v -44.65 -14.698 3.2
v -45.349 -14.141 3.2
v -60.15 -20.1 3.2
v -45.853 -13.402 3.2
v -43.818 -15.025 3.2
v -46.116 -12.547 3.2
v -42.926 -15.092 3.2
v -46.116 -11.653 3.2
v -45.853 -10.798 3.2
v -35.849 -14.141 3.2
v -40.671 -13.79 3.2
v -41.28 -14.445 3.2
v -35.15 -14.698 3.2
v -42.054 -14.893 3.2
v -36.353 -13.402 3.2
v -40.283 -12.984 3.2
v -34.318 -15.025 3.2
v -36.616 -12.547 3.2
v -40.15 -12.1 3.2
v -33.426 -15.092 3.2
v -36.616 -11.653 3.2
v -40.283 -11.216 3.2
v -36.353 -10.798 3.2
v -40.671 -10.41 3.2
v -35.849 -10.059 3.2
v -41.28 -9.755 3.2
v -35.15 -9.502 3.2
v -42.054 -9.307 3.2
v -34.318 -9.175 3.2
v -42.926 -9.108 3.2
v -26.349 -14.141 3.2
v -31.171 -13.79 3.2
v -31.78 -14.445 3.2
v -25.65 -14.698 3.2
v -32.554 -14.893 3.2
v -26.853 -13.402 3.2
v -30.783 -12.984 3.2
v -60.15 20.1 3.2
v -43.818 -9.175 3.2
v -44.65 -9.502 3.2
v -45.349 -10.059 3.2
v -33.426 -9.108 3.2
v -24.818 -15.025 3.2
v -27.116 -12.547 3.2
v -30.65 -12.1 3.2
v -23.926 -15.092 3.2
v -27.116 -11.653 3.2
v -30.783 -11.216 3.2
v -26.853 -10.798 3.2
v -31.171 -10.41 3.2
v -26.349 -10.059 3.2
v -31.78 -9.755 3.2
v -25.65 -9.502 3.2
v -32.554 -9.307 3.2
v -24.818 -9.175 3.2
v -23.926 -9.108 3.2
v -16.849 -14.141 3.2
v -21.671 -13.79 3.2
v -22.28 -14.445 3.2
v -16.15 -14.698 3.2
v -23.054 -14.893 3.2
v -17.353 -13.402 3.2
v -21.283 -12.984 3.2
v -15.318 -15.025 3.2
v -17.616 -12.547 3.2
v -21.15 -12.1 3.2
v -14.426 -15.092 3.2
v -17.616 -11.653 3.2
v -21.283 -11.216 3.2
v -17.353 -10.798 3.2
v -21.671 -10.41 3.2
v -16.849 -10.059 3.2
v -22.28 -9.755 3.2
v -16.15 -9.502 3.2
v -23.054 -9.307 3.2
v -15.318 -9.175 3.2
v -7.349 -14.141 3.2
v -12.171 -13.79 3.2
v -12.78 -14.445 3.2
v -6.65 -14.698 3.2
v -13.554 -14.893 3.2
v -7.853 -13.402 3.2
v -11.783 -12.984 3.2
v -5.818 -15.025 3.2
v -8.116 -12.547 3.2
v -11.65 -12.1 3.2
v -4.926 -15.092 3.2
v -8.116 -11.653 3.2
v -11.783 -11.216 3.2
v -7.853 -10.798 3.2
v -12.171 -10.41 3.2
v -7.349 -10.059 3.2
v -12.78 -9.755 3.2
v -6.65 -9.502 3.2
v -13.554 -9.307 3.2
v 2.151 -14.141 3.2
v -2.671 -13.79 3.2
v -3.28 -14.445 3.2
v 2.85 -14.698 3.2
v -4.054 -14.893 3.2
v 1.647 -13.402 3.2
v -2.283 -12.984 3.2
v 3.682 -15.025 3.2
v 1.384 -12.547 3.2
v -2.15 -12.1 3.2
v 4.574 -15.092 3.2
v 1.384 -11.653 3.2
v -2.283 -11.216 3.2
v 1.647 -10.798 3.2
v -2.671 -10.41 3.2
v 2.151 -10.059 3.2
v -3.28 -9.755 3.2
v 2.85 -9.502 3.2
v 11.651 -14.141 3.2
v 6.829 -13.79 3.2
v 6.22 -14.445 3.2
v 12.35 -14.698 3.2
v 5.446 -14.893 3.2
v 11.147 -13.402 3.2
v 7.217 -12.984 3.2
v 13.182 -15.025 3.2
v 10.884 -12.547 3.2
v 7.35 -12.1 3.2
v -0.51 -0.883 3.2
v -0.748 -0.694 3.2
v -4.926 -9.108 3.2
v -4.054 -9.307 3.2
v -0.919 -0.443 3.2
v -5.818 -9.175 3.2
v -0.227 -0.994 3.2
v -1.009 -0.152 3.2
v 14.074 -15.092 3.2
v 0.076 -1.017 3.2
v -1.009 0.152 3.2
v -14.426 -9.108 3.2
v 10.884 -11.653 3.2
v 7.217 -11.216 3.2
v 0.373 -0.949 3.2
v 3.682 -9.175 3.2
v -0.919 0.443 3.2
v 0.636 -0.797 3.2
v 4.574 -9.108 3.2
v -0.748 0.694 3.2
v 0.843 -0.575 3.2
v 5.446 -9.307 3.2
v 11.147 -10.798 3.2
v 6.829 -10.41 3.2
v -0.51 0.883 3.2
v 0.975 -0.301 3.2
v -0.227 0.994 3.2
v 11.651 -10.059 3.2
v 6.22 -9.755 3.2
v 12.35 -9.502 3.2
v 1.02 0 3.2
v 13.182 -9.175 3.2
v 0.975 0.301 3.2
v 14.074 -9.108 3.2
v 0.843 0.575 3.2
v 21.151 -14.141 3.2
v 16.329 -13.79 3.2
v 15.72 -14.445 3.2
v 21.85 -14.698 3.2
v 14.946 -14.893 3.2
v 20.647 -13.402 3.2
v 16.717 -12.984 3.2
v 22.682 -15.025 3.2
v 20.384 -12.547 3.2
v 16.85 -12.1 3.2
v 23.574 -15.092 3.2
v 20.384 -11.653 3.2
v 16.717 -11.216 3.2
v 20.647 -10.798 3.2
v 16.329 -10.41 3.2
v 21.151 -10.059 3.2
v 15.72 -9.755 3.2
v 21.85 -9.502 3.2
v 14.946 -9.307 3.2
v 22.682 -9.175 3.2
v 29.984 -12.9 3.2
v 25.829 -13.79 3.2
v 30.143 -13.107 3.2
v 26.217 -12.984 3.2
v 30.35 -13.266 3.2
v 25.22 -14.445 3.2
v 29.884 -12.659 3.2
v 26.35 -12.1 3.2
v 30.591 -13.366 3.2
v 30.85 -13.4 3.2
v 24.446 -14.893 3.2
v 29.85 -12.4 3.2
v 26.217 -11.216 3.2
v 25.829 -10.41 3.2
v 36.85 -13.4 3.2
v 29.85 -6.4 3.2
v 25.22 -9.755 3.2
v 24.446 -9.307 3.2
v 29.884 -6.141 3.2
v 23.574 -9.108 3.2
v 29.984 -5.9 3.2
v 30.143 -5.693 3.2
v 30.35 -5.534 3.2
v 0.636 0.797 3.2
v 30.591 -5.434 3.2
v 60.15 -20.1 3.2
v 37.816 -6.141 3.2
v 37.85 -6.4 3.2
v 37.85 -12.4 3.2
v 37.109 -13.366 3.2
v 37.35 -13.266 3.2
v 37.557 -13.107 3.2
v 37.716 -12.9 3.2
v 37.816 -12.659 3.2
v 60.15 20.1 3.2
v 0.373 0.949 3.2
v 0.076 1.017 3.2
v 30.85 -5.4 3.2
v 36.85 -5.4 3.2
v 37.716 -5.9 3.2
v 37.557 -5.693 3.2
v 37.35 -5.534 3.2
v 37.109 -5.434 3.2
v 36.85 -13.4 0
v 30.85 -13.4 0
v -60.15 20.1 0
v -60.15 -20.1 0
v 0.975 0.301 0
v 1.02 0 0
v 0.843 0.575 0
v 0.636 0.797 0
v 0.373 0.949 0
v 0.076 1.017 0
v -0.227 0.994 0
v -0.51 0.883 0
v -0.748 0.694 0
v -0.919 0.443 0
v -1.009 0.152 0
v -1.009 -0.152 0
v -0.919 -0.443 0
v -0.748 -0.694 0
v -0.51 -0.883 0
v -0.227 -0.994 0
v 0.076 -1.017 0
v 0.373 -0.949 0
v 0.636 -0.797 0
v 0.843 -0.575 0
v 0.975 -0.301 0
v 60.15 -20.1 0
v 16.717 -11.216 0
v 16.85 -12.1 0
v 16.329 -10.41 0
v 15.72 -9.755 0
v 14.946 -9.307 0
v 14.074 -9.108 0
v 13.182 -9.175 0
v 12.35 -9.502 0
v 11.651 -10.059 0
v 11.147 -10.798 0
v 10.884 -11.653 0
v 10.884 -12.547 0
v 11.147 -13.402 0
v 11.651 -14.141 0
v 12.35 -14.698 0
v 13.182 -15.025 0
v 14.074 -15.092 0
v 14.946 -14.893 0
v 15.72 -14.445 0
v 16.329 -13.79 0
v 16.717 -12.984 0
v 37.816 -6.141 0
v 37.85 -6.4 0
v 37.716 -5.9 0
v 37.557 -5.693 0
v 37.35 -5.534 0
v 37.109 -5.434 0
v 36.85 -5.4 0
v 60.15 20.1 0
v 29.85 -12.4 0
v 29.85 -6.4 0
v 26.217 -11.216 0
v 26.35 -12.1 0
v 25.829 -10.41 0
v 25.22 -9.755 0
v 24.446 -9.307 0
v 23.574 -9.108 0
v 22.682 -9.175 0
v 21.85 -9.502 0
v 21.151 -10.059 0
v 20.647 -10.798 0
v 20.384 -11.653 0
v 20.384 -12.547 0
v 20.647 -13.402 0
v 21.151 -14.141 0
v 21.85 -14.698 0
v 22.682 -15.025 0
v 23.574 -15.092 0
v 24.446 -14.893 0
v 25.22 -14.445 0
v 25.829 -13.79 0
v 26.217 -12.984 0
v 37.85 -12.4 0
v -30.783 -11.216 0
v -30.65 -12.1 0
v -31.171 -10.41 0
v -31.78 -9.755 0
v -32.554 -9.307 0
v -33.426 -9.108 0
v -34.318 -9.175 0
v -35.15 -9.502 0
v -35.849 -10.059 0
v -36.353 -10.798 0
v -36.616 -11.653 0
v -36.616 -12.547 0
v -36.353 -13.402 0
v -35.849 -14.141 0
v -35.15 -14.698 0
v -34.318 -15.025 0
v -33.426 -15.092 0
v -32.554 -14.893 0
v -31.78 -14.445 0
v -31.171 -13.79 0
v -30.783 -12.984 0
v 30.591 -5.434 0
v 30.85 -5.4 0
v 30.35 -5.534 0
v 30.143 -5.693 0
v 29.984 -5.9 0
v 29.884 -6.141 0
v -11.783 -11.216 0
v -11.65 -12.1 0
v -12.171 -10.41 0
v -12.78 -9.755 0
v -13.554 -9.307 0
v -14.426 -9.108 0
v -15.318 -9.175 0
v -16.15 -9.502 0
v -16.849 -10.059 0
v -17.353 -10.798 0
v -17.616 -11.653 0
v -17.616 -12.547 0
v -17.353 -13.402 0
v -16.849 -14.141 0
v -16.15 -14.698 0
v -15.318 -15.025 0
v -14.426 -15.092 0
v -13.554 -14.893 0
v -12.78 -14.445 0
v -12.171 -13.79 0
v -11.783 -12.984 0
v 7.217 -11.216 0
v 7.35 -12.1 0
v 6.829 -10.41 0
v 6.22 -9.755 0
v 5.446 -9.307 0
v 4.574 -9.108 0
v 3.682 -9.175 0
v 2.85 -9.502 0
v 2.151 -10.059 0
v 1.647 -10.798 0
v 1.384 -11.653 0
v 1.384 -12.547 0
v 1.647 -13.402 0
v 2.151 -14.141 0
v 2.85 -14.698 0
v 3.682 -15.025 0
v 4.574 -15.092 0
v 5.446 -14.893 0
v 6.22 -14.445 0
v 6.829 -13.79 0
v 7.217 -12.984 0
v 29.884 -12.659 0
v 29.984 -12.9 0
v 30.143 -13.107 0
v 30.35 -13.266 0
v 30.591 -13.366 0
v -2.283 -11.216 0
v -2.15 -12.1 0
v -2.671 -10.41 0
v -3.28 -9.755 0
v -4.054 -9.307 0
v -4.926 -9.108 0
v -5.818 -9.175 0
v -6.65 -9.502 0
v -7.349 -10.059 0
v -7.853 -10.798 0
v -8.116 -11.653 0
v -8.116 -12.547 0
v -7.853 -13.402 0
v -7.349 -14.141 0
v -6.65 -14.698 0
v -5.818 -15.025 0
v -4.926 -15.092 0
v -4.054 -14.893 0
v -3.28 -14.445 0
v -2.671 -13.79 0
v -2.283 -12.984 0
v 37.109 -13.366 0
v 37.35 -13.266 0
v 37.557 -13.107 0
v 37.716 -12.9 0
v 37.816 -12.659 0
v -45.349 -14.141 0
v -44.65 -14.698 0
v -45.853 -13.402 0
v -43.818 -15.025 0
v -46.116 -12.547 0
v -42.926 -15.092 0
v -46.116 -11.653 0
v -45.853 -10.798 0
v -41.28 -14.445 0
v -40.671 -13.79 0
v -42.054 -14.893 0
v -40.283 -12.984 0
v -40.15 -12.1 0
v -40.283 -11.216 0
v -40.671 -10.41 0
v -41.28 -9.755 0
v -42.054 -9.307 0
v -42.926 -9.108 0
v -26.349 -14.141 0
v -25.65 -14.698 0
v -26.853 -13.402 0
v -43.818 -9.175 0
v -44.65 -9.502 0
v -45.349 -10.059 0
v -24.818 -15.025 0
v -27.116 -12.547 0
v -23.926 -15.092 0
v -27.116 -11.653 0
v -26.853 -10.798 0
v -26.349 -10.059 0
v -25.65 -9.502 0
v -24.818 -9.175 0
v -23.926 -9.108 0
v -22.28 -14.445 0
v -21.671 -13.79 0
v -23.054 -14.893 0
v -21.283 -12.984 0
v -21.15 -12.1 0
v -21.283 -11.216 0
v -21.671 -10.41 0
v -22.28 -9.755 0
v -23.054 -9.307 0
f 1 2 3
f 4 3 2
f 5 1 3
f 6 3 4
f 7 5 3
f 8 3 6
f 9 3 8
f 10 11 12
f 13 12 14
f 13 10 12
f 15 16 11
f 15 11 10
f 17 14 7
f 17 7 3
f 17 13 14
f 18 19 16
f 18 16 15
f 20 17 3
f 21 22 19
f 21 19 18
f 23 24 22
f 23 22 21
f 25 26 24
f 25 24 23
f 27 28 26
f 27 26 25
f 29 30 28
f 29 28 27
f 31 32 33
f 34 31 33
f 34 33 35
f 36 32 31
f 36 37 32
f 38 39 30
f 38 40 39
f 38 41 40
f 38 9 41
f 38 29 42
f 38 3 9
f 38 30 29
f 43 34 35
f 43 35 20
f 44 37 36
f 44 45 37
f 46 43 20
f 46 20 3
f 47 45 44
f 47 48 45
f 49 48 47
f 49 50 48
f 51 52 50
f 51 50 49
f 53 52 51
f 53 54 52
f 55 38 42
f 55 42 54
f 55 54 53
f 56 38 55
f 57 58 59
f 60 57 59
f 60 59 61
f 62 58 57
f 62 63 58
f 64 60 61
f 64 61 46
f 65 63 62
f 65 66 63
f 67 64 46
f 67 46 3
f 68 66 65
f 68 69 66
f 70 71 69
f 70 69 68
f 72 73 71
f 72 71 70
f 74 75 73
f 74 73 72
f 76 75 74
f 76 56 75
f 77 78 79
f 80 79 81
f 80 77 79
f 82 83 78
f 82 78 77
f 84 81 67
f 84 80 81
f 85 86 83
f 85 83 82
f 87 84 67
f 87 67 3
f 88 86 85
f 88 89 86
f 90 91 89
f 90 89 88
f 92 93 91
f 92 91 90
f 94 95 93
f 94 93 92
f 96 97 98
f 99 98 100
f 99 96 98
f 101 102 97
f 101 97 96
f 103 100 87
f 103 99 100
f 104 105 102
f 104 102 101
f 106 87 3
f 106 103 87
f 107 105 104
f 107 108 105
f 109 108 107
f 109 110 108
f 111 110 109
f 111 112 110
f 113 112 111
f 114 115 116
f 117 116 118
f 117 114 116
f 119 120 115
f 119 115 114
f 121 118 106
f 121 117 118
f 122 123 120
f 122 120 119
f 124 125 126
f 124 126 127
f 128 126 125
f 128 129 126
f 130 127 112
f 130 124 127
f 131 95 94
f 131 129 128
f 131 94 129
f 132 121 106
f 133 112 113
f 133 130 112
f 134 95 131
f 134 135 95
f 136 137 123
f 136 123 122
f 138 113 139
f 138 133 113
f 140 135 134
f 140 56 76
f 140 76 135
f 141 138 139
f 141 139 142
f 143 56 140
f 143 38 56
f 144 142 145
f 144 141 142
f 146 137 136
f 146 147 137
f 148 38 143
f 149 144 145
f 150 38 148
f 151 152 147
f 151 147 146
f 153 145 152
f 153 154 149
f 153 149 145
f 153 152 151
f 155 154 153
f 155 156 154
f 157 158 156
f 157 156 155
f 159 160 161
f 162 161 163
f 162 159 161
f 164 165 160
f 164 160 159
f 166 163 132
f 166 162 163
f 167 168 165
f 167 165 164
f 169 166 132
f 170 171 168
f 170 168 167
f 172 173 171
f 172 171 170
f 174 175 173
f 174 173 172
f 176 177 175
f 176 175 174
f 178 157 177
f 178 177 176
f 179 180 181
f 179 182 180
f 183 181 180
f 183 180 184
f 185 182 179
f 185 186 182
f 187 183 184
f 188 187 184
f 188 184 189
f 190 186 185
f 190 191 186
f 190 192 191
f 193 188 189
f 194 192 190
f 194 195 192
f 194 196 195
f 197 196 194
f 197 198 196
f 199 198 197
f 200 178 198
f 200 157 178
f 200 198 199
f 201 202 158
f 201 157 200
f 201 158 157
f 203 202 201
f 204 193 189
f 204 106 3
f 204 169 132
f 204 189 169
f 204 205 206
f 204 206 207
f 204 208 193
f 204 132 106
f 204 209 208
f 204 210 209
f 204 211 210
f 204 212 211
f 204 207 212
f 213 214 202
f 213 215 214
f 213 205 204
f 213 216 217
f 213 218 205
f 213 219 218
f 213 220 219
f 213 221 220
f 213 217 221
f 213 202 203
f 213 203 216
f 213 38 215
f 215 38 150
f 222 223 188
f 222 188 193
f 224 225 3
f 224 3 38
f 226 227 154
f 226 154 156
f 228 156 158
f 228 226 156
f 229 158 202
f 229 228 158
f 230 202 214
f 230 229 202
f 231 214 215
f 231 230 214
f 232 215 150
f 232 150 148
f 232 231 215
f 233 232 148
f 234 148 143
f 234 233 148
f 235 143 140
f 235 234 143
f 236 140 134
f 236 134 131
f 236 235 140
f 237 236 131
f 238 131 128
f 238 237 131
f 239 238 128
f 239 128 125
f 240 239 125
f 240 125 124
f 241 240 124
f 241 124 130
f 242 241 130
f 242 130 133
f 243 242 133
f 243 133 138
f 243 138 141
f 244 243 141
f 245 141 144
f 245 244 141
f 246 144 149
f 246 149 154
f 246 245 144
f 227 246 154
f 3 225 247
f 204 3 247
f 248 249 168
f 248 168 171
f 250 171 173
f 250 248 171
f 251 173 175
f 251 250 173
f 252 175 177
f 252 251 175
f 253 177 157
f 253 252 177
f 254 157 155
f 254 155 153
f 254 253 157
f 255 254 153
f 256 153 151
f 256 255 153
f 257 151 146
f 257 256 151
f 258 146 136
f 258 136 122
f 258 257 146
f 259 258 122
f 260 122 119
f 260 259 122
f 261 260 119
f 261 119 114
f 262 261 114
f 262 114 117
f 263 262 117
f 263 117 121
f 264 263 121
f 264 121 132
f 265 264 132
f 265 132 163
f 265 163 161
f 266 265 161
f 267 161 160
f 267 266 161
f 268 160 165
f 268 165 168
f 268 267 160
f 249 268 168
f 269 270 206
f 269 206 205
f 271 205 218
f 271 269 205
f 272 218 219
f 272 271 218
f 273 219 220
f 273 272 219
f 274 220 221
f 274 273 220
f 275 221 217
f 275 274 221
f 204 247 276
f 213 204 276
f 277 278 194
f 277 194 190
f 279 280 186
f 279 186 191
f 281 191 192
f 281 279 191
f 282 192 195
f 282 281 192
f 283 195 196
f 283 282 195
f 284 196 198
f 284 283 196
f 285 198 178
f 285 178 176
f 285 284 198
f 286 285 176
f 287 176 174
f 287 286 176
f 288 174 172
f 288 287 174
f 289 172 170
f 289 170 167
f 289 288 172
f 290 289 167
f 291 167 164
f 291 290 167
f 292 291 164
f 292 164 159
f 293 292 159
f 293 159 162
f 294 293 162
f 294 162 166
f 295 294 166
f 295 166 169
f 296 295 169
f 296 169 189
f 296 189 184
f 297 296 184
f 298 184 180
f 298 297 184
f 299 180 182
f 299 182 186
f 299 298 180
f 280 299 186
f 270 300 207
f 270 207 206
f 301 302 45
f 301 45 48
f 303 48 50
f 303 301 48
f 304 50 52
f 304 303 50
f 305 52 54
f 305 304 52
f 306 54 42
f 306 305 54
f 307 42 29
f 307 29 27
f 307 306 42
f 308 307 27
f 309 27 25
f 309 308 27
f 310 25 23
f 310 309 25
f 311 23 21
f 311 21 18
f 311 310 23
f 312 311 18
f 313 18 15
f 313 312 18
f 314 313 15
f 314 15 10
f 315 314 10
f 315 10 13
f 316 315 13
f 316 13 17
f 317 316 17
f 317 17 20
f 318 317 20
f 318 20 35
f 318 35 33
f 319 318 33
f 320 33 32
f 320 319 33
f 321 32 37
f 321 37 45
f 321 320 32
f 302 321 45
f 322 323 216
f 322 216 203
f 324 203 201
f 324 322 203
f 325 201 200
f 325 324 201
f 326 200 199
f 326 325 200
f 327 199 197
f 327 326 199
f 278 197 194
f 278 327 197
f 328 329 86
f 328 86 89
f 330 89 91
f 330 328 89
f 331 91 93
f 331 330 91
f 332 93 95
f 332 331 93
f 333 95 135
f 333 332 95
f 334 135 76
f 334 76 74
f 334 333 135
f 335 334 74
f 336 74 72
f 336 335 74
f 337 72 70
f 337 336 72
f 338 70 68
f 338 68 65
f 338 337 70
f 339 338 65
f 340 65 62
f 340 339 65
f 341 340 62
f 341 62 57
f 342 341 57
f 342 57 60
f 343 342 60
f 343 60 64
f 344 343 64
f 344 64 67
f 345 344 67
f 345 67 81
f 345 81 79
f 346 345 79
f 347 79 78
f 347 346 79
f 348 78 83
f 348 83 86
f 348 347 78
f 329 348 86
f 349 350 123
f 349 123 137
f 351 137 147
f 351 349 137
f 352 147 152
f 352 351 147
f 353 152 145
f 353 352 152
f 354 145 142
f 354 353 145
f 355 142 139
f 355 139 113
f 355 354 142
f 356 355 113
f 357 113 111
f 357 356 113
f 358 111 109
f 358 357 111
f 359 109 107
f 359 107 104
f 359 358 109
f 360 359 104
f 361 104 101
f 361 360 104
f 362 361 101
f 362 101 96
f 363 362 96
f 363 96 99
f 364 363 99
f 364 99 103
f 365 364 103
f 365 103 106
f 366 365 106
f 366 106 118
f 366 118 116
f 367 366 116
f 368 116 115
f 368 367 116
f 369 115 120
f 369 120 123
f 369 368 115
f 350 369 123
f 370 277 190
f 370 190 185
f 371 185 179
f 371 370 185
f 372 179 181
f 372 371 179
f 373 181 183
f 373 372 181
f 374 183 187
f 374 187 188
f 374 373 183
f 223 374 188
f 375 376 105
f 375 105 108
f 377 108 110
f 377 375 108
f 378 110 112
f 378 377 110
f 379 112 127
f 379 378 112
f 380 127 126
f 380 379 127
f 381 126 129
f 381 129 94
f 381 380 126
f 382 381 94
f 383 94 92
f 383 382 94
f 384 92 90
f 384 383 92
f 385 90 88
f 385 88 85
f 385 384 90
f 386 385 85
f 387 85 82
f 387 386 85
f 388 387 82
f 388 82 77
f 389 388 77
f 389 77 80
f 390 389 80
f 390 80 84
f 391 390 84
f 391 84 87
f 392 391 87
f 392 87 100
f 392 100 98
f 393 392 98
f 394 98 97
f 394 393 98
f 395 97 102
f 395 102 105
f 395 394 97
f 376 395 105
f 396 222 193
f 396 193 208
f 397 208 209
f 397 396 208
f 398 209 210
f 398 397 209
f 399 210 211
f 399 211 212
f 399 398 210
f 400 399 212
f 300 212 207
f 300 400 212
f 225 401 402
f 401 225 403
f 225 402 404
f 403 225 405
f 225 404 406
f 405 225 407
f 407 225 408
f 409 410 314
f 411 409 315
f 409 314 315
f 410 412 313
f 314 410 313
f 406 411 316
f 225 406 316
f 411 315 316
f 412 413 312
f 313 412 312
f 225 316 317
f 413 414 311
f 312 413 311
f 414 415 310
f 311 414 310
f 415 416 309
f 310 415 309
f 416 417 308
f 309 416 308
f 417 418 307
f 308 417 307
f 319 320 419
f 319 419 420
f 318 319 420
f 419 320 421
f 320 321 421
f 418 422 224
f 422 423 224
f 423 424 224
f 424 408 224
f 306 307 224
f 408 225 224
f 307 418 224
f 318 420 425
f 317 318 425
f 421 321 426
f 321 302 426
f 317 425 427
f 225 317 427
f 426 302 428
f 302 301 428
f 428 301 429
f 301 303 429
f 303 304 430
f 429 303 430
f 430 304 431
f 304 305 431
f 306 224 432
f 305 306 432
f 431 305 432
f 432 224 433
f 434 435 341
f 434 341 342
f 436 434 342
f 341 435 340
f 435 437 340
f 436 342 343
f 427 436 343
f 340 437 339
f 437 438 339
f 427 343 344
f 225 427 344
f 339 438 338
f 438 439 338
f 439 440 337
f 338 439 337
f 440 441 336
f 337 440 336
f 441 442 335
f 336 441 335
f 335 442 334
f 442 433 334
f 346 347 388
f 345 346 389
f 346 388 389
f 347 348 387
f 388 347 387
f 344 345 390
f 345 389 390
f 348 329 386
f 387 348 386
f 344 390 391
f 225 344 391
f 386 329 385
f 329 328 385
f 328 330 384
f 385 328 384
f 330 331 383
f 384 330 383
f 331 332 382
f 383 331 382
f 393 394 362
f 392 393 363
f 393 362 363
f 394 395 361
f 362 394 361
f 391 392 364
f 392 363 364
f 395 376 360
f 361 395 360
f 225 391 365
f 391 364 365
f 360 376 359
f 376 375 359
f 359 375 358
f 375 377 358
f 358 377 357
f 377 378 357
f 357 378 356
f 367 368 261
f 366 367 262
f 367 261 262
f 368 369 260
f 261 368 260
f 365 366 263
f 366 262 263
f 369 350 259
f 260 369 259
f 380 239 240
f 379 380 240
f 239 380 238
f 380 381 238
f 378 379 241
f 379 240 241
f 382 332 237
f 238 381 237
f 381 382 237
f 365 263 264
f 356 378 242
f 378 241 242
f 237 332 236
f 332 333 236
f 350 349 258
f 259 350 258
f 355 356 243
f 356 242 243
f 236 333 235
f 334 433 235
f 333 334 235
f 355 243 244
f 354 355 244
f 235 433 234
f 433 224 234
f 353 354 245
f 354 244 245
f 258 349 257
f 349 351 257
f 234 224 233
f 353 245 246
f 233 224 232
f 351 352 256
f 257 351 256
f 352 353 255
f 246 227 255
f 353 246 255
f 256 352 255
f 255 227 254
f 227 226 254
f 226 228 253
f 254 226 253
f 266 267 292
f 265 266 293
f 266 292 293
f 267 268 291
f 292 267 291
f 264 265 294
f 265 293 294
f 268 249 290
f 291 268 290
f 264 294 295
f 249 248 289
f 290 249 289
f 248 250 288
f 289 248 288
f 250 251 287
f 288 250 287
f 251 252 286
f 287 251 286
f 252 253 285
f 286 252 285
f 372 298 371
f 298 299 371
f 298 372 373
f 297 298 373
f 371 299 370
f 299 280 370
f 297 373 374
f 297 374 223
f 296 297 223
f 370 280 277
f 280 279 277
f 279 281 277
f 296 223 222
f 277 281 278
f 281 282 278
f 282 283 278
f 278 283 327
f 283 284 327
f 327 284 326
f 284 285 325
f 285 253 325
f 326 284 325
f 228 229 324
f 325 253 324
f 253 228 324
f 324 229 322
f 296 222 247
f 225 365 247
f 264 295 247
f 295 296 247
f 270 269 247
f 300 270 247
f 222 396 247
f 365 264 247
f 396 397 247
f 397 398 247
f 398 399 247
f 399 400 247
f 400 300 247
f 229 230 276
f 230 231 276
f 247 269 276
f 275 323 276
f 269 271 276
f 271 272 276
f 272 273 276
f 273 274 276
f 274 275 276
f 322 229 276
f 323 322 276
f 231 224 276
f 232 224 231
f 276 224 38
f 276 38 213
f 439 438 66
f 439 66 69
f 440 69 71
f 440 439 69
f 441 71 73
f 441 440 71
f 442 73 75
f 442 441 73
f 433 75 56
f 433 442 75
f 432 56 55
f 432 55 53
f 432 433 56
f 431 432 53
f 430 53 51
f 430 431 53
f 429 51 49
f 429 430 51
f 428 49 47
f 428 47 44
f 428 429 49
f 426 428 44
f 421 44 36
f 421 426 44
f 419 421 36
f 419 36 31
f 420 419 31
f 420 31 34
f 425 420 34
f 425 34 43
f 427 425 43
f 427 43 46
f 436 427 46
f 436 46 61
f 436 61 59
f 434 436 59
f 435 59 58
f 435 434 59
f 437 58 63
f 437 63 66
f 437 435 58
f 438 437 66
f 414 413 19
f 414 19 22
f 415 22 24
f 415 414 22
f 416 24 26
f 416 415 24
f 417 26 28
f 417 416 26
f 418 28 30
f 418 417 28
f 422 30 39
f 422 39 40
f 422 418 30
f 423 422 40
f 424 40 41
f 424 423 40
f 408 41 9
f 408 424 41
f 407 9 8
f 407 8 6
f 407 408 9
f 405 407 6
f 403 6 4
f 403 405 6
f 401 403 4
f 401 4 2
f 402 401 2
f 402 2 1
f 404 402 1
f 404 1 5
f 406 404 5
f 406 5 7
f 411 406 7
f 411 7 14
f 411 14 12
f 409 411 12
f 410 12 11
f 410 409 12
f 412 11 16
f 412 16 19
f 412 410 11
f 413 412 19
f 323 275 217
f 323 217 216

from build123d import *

# Parameters (mm, degrees)
SKETCH_W   = 120.3
SKETCH_H   = 40.2
SKETCH_R   = 3
SKETCH_R_2 = 1.02
PAD_DEPTH  = 3.2


with BuildPart() as part:
    # Sketch → Pad (new body)
    with BuildSketch(Plane.XY):
        Rectangle(SKETCH_W, SKETCH_H)
        with Locations((-43.15, -12.1)):
            Circle(SKETCH_R, mode=Mode.SUBTRACT)
        with Locations((-33.65, -12.1)):
            Circle(SKETCH_R, mode=Mode.SUBTRACT)
        with Locations((-24.15, -12.1)):
            Circle(SKETCH_R, mode=Mode.SUBTRACT)
        with Locations((-14.65, -12.1)):
            Circle(SKETCH_R, mode=Mode.SUBTRACT)
        with Locations((13.85, -12.1)):
            Circle(SKETCH_R, mode=Mode.SUBTRACT)
        with Locations((-5.15, -12.1)):
            Circle(SKETCH_R, mode=Mode.SUBTRACT)
        with Locations((4.35, -12.1)):
            Circle(SKETCH_R, mode=Mode.SUBTRACT)
        with Locations((23.35, -12.1)):
            Circle(SKETCH_R, mode=Mode.SUBTRACT)
        Circle(SKETCH_R_2, mode=Mode.SUBTRACT)
        with BuildLine():
            Line((36.85, -5.4), (30.85, -5.4))
            ThreePointArc((30.85, -5.4), (30.142893, -5.692893), (29.85, -6.4))
            Line((29.85, -6.4), (29.85, -12.4))
            ThreePointArc((29.85, -12.4), (30.142893, -13.107107), (30.85, -13.4))
            Line((30.85, -13.4), (36.85, -13.4))
            ThreePointArc((36.85, -13.4), (37.557107, -13.107107), (37.85, -12.4))
            Line((37.85, -12.4), (37.85, -6.4))
            ThreePointArc((37.85, -6.4), (37.557107, -5.692893), (36.85, -5.4))
        make_face(mode=Mode.SUBTRACT)
    extrude(amount=PAD_DEPTH)


solid = part.part
